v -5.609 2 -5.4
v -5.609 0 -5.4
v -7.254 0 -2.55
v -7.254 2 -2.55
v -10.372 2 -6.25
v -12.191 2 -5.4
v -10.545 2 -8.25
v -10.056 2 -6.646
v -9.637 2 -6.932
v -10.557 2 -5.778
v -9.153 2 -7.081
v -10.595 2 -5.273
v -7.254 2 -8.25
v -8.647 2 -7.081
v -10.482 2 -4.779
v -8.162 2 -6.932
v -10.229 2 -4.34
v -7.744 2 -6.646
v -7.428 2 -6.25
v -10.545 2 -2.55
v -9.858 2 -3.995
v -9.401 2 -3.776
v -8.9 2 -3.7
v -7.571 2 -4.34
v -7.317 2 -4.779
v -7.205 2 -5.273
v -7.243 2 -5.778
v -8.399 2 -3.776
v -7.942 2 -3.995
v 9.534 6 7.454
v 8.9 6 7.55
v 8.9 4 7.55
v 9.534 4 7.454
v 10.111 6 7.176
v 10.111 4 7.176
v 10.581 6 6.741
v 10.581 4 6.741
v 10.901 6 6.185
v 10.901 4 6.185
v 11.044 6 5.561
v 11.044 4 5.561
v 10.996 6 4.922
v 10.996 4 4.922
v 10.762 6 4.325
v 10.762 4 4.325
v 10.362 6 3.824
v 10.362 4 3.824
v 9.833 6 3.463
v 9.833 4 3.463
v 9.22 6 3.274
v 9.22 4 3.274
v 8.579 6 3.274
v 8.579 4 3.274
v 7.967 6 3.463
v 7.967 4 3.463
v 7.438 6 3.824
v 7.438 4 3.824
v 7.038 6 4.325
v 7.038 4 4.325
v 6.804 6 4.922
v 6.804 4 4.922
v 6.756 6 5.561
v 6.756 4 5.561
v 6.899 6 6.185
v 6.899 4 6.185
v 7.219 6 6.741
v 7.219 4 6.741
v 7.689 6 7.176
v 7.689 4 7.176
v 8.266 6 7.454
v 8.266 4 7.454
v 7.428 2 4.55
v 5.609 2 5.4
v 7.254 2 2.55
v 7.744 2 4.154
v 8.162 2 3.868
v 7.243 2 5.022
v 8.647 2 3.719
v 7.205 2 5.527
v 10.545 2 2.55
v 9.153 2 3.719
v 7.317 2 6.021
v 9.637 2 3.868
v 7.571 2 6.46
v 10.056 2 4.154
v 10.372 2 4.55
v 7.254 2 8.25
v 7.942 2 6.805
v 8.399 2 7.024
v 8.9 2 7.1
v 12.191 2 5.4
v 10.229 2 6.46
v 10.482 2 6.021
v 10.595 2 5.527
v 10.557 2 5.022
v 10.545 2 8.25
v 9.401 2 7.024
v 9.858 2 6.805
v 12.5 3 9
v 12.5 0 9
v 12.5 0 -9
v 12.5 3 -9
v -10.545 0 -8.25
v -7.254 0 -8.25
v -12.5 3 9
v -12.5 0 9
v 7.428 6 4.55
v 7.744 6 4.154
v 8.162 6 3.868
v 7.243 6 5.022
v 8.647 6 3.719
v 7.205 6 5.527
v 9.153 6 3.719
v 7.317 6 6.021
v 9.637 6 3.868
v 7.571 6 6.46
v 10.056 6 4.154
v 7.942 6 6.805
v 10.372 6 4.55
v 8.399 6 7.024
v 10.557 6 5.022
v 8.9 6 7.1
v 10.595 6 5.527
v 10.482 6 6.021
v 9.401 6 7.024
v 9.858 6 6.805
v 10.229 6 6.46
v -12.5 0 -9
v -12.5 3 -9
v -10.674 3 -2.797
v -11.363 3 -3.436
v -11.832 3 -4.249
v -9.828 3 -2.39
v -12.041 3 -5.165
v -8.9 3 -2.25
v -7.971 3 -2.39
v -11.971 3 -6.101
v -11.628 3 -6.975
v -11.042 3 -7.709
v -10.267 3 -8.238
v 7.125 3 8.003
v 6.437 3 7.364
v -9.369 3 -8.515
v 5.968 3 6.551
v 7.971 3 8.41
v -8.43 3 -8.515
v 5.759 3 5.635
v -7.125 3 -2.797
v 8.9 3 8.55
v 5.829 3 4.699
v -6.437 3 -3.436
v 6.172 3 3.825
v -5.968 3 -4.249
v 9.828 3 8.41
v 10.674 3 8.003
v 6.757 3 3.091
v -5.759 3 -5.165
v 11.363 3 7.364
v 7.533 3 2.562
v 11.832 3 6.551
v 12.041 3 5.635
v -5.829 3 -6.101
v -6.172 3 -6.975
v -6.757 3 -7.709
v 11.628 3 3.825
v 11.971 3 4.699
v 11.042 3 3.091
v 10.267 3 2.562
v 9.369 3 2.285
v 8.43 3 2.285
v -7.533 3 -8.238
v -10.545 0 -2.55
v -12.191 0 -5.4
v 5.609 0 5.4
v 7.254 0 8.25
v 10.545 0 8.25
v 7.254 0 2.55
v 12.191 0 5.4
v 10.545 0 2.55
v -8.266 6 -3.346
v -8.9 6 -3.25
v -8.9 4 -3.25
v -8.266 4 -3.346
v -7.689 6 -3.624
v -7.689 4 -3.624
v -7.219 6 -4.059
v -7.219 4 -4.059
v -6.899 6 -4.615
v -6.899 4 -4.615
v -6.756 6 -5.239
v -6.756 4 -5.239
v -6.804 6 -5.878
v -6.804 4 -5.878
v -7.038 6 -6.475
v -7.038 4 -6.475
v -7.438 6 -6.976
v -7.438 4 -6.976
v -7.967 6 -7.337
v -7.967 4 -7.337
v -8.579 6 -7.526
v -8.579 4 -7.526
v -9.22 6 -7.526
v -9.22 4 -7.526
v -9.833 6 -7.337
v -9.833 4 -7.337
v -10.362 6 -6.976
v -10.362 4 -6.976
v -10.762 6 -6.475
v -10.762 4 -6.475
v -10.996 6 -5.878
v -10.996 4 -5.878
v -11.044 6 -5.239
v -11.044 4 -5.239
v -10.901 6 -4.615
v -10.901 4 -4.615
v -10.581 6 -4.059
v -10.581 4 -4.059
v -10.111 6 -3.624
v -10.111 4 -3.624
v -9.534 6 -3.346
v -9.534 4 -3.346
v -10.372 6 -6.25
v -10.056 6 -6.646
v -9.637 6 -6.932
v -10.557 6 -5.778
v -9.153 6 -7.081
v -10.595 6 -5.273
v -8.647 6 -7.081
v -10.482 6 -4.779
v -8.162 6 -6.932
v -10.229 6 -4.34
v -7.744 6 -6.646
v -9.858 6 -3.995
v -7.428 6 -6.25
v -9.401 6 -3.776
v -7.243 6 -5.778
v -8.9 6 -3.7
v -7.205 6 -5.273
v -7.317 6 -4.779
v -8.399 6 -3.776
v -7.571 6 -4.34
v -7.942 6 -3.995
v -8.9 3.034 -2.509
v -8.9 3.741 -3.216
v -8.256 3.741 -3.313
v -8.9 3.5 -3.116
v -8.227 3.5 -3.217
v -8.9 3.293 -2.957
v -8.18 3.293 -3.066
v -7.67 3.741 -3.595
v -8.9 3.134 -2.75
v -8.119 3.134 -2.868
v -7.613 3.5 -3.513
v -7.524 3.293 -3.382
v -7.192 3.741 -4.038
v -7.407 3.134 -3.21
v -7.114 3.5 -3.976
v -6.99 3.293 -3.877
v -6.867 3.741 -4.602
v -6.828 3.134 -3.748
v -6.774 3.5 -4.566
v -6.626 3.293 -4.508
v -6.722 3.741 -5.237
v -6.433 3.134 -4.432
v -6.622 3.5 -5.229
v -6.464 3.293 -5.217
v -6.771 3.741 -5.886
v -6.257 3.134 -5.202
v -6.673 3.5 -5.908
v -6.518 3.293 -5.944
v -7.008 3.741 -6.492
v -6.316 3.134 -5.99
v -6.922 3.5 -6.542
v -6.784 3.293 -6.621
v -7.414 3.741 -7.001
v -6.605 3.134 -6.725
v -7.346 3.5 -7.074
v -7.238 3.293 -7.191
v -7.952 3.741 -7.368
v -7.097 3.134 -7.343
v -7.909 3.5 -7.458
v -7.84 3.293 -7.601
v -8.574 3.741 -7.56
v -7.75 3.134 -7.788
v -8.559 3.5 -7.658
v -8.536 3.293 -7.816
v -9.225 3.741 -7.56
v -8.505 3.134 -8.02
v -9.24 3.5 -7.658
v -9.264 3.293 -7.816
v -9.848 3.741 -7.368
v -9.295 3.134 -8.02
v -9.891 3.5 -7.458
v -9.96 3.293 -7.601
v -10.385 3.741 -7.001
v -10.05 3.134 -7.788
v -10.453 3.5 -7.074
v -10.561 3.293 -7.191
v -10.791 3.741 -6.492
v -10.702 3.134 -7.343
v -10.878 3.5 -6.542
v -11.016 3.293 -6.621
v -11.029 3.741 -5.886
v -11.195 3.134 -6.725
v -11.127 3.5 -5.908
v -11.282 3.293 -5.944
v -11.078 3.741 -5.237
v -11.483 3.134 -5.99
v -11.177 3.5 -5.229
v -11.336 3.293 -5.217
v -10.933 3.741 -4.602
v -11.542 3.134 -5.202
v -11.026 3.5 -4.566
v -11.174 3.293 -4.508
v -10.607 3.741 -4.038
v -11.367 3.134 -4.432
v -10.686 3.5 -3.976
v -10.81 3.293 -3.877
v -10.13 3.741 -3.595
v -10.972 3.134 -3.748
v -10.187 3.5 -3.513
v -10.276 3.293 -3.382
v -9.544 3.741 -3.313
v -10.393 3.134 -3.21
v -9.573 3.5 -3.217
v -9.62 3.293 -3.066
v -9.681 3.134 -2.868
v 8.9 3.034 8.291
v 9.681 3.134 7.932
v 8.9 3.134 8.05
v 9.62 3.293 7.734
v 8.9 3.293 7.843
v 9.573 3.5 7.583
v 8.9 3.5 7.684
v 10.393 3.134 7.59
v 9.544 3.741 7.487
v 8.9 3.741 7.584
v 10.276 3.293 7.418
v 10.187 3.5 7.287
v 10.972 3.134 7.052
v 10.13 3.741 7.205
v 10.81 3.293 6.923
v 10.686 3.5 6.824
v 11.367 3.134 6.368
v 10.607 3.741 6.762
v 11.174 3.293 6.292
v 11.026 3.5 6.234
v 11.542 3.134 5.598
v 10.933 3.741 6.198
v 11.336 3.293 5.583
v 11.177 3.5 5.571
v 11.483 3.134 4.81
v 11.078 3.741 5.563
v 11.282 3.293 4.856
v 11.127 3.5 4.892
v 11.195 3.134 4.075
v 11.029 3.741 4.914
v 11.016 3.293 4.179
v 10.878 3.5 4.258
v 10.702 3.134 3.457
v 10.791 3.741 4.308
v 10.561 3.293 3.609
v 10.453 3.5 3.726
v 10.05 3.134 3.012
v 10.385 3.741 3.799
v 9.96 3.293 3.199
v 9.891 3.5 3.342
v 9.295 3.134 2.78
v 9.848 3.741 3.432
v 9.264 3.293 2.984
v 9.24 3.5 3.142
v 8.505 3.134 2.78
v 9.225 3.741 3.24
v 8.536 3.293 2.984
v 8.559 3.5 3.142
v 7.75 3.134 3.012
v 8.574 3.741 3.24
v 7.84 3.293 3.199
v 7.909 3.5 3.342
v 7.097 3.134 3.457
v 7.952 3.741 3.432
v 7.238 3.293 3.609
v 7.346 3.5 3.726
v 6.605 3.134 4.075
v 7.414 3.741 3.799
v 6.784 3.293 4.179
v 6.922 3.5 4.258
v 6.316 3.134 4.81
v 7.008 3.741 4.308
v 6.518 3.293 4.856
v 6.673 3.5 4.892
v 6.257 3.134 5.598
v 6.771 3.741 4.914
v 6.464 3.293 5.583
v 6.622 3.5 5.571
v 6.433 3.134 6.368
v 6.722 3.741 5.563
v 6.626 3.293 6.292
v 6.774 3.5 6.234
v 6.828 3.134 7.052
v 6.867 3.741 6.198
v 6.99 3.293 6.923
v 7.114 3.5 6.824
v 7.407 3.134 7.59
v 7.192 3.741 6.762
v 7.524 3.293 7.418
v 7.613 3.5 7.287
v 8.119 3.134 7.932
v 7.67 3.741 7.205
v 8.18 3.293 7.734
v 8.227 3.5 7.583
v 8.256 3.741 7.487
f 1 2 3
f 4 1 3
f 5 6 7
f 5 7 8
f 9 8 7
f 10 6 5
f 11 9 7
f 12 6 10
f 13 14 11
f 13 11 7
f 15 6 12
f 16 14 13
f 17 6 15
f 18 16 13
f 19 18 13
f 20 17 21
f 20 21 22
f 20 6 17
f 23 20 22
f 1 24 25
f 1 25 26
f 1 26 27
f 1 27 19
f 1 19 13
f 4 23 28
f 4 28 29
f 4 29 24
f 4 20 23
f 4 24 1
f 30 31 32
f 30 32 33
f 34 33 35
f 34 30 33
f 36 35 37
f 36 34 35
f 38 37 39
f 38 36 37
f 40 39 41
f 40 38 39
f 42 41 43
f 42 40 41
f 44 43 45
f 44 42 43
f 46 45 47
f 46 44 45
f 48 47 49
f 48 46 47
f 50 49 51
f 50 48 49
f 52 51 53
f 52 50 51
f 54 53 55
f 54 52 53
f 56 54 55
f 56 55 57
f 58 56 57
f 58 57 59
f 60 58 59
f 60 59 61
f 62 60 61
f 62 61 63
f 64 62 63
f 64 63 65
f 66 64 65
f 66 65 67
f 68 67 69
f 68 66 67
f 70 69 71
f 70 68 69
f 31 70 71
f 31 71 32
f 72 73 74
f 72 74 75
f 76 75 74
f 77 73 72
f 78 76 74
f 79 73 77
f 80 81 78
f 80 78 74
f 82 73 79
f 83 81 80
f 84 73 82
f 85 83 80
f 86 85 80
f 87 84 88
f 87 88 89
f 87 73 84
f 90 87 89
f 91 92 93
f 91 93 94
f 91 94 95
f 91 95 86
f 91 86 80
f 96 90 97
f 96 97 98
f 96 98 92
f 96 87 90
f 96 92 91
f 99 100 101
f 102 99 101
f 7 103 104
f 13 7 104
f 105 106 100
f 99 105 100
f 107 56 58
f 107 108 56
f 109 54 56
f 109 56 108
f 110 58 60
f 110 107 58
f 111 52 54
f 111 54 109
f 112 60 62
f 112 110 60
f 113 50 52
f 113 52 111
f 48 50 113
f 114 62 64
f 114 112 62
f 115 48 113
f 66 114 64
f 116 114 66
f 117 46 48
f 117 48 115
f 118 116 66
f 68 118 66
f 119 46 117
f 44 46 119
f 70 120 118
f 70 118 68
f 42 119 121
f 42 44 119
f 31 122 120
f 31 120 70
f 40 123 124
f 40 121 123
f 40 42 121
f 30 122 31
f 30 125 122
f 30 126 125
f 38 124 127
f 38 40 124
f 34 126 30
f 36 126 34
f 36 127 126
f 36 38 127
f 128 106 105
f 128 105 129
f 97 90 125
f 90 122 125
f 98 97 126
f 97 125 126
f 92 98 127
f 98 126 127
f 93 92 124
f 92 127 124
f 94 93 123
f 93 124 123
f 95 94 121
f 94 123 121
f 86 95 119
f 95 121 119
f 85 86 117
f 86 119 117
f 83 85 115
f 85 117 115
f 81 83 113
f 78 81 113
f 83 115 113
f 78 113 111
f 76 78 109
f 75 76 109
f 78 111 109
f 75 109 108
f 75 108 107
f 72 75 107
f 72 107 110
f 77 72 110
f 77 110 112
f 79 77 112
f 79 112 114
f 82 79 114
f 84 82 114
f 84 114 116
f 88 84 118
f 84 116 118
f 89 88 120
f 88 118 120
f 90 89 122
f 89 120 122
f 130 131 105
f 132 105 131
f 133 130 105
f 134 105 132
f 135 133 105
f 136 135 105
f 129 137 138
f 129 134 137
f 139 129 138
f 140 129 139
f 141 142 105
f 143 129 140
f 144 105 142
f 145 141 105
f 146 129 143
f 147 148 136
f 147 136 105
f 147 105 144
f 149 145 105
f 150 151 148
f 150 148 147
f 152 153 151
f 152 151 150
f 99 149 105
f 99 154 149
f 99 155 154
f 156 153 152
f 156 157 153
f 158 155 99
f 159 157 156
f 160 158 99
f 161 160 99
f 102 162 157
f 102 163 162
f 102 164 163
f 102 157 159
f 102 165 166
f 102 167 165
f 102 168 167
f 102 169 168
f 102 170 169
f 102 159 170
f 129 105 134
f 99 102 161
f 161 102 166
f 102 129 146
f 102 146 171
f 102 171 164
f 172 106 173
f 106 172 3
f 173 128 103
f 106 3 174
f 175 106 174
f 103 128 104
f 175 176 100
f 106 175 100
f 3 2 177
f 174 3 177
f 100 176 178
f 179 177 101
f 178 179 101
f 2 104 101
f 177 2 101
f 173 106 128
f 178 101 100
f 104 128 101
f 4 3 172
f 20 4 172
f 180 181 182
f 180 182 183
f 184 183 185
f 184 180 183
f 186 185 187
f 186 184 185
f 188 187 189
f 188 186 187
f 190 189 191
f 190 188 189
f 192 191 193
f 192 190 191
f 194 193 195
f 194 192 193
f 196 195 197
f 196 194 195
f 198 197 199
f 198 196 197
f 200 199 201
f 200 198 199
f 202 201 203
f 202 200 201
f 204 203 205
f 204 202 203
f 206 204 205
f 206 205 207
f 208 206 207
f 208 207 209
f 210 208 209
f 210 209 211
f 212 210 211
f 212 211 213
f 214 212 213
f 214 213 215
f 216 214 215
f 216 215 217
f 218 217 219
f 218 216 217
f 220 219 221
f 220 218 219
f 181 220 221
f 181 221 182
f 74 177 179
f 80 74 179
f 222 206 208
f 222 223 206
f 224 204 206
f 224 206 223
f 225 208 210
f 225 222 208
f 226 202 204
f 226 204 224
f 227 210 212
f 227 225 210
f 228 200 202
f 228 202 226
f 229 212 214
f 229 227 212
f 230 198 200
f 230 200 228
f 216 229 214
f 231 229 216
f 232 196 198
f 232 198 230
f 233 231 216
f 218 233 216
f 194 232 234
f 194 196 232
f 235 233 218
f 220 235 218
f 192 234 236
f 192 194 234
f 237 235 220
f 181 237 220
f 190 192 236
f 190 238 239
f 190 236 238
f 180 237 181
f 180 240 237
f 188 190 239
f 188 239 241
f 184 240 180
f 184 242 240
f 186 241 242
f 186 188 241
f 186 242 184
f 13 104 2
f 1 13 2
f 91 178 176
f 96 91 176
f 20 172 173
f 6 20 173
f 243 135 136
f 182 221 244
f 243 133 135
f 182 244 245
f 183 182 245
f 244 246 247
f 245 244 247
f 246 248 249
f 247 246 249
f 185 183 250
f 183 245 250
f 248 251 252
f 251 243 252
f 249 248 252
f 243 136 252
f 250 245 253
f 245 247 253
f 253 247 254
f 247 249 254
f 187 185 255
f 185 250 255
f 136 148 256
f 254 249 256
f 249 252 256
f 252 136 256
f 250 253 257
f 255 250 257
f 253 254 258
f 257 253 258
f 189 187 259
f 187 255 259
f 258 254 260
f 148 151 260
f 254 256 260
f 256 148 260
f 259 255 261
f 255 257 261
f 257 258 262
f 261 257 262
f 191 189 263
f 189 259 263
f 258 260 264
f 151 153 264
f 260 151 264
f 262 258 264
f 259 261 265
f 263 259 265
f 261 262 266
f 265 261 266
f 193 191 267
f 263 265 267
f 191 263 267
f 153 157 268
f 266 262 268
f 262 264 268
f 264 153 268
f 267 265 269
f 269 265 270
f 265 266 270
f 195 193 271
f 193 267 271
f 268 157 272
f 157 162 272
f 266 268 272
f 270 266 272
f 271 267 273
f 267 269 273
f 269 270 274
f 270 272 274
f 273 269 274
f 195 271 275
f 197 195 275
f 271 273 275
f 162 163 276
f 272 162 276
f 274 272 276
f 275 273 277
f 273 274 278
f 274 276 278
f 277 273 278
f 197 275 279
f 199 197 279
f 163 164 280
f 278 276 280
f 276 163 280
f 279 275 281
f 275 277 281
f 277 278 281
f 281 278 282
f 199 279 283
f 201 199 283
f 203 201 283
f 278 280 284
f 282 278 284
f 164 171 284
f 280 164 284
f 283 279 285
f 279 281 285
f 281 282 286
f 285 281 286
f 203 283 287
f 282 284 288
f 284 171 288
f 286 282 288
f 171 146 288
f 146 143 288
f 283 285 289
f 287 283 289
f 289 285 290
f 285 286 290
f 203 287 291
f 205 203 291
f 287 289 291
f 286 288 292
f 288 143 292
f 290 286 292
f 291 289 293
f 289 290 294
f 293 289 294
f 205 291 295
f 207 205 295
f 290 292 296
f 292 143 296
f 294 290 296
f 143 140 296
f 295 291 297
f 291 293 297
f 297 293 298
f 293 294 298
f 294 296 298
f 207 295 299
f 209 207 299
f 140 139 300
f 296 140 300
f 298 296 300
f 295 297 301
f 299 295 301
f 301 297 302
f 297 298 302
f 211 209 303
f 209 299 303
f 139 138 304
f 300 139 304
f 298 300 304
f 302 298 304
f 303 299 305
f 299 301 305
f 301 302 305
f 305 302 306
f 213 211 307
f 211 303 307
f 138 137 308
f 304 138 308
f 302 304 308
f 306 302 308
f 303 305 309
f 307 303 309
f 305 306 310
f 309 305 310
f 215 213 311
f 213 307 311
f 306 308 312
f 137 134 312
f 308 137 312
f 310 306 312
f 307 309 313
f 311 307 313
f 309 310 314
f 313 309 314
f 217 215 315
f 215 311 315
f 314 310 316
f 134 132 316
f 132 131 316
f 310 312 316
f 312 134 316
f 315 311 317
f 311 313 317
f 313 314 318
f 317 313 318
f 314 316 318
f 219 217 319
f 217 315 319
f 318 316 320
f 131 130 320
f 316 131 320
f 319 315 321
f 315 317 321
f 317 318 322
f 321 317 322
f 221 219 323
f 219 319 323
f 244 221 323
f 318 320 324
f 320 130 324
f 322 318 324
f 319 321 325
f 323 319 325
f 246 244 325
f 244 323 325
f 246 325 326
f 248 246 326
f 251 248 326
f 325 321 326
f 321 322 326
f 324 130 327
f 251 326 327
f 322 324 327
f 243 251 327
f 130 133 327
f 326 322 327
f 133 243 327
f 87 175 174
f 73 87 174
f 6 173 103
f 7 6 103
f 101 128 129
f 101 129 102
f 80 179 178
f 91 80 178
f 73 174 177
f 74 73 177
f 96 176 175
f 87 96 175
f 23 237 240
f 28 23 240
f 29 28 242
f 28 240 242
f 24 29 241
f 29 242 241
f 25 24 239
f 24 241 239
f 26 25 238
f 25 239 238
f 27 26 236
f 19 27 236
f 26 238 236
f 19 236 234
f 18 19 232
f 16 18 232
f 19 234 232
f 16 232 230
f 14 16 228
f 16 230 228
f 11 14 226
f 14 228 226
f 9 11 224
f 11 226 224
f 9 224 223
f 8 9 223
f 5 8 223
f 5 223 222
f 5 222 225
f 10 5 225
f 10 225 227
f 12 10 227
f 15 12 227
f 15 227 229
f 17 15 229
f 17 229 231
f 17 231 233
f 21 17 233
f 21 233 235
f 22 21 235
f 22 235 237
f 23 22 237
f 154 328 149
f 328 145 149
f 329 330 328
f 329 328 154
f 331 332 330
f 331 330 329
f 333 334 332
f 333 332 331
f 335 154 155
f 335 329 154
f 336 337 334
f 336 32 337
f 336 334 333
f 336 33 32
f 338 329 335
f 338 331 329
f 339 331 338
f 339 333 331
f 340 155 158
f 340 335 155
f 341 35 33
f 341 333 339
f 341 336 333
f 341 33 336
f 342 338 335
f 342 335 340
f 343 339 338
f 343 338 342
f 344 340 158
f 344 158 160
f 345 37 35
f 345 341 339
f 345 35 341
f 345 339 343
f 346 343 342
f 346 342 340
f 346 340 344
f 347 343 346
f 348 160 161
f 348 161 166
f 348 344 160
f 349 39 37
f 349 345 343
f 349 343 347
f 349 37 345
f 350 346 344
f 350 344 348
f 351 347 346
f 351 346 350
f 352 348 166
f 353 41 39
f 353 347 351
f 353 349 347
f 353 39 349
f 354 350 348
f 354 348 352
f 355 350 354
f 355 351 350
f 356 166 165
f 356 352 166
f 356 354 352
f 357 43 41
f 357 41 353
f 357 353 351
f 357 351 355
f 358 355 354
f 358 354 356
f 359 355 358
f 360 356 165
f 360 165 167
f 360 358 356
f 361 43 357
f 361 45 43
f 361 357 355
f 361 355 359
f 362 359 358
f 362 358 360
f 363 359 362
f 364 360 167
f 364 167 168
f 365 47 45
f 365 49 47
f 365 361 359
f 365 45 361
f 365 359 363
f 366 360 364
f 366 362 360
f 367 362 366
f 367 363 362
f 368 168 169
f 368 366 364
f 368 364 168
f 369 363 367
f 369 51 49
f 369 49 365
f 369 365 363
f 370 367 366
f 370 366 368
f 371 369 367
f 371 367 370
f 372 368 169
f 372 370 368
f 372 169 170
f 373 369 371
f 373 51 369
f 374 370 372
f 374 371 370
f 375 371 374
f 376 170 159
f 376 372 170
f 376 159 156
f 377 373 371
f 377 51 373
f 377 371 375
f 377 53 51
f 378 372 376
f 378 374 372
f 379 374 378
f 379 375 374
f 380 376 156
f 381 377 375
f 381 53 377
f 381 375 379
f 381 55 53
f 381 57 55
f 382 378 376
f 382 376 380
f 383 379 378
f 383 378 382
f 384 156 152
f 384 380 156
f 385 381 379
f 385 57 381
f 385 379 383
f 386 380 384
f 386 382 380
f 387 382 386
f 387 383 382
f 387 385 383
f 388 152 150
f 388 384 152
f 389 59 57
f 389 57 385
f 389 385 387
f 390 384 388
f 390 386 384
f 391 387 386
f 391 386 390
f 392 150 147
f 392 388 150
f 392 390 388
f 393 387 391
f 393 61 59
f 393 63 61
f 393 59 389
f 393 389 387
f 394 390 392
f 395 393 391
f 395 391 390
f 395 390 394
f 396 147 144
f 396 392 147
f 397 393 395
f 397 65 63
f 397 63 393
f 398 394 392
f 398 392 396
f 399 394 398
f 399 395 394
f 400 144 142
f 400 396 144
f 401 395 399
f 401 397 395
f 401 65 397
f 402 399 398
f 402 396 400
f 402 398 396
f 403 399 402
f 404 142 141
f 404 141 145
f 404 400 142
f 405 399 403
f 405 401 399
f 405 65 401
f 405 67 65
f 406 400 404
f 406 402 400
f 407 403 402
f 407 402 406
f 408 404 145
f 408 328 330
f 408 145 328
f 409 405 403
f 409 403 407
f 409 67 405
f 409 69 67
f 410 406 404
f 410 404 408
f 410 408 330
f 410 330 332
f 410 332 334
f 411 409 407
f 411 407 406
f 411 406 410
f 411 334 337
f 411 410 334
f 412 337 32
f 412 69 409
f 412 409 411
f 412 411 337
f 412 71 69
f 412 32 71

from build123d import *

# Parameters (mm, degrees)
SKETCH2_W           = 25
SKETCH2_H           = 18
BOSS_EXTRUDE1_DEPTH = 3
SKETCH3_R           = 1.7
CUT_EXTRUDE1_DEPTH  = 16.692354826
BOSS_EXTRUDE2_START = 3
SKETCH4_R           = 2.15
SKETCH4_R_2         = 1.7
BOSS_EXTRUDE2_DEPTH = 3
FILLET1_R           = 1
CUT_EXTRUDE2_DEPTH  = 2


with BuildPart() as part:
    # Sketch2 → Boss-Extrude1 (new body)
    with BuildSketch(Plane(origin=(0, 0, 0), x_dir=(1, 0, 0), z_dir=(0, 1, 0))):
        Rectangle(SKETCH2_W, SKETCH2_H)
    extrude(amount=BOSS_EXTRUDE1_DEPTH)

    # Sketch3 → Cut-Extrude1 (cut, through all)
    with BuildSketch(Plane(origin=(0, 3, 0), x_dir=(1, 0, 0), z_dir=(0, 1, 0))):
        with Locations(Location((-8.899893258, 5.4, 0), (0, 0, 270))):
            Circle(SKETCH3_R)
        with Locations(Location((8.899893258, -5.4, 0), (0, 0, 270))):
            Circle(SKETCH3_R)
    extrude(amount=-CUT_EXTRUDE1_DEPTH, mode=Mode.SUBTRACT)

    # Sketch4 → Boss-Extrude2 (add)
    # profile 1 of 2: a face of its own
    with BuildSketch(Plane(origin=(0, 3, 0), x_dir=(1, 0, 0), z_dir=(0, 1, 0)).offset(BOSS_EXTRUDE2_START)):
        with Locations(Location((-8.899893258, 5.4, 0), (0, 0, 270))):
            Circle(SKETCH4_R)
        with Locations(Location((-8.899893258, 5.4, 0), (0, 0, 270))):
            Circle(SKETCH4_R_2, mode=Mode.SUBTRACT)
    # profile 2 of 2: a face of its own
    with BuildSketch(Plane(origin=(0, 3, 0), x_dir=(1, 0, 0), z_dir=(0, 1, 0)).offset(BOSS_EXTRUDE2_START)):
        with Locations(Location((8.899893258, -5.4, 0), (0, 0, 270))):
            Circle(SKETCH4_R)
        with Locations(Location((8.899893258, -5.4, 0), (0, 0, 270))):
            Circle(SKETCH4_R_2, mode=Mode.SUBTRACT)
    extrude(amount=-BOSS_EXTRUDE2_DEPTH)

    # Fillet1
    fillet1_edges = [part.edges().sort_by_distance(p)[0] for p in [
        (-8.899893258, 3, -7.55),
        (8.899893258, 3, 3.25),
    ]]
    fillet(fillet1_edges, radius=FILLET1_R)

    # Sketch5 → Cut-Extrude2 (cut)
    with BuildSketch(Plane.XZ):
        Polygon((10.545341525, 2.55), (12.190789792, 5.4), (10.545341525, 8.25), (7.254444991, 8.25), (5.608996723, 5.4), (7.254444991, 2.55), align=None)
        Polygon((-7.254444991, -8.25), (-5.608996723, -5.4), (-7.254444991, -2.55), (-10.545341525, -2.55), (-12.190789792, -5.4), (-10.545341525, -8.25), align=None)
    extrude(amount=-CUT_EXTRUDE2_DEPTH, mode=Mode.SUBTRACT)


solid = part.part
